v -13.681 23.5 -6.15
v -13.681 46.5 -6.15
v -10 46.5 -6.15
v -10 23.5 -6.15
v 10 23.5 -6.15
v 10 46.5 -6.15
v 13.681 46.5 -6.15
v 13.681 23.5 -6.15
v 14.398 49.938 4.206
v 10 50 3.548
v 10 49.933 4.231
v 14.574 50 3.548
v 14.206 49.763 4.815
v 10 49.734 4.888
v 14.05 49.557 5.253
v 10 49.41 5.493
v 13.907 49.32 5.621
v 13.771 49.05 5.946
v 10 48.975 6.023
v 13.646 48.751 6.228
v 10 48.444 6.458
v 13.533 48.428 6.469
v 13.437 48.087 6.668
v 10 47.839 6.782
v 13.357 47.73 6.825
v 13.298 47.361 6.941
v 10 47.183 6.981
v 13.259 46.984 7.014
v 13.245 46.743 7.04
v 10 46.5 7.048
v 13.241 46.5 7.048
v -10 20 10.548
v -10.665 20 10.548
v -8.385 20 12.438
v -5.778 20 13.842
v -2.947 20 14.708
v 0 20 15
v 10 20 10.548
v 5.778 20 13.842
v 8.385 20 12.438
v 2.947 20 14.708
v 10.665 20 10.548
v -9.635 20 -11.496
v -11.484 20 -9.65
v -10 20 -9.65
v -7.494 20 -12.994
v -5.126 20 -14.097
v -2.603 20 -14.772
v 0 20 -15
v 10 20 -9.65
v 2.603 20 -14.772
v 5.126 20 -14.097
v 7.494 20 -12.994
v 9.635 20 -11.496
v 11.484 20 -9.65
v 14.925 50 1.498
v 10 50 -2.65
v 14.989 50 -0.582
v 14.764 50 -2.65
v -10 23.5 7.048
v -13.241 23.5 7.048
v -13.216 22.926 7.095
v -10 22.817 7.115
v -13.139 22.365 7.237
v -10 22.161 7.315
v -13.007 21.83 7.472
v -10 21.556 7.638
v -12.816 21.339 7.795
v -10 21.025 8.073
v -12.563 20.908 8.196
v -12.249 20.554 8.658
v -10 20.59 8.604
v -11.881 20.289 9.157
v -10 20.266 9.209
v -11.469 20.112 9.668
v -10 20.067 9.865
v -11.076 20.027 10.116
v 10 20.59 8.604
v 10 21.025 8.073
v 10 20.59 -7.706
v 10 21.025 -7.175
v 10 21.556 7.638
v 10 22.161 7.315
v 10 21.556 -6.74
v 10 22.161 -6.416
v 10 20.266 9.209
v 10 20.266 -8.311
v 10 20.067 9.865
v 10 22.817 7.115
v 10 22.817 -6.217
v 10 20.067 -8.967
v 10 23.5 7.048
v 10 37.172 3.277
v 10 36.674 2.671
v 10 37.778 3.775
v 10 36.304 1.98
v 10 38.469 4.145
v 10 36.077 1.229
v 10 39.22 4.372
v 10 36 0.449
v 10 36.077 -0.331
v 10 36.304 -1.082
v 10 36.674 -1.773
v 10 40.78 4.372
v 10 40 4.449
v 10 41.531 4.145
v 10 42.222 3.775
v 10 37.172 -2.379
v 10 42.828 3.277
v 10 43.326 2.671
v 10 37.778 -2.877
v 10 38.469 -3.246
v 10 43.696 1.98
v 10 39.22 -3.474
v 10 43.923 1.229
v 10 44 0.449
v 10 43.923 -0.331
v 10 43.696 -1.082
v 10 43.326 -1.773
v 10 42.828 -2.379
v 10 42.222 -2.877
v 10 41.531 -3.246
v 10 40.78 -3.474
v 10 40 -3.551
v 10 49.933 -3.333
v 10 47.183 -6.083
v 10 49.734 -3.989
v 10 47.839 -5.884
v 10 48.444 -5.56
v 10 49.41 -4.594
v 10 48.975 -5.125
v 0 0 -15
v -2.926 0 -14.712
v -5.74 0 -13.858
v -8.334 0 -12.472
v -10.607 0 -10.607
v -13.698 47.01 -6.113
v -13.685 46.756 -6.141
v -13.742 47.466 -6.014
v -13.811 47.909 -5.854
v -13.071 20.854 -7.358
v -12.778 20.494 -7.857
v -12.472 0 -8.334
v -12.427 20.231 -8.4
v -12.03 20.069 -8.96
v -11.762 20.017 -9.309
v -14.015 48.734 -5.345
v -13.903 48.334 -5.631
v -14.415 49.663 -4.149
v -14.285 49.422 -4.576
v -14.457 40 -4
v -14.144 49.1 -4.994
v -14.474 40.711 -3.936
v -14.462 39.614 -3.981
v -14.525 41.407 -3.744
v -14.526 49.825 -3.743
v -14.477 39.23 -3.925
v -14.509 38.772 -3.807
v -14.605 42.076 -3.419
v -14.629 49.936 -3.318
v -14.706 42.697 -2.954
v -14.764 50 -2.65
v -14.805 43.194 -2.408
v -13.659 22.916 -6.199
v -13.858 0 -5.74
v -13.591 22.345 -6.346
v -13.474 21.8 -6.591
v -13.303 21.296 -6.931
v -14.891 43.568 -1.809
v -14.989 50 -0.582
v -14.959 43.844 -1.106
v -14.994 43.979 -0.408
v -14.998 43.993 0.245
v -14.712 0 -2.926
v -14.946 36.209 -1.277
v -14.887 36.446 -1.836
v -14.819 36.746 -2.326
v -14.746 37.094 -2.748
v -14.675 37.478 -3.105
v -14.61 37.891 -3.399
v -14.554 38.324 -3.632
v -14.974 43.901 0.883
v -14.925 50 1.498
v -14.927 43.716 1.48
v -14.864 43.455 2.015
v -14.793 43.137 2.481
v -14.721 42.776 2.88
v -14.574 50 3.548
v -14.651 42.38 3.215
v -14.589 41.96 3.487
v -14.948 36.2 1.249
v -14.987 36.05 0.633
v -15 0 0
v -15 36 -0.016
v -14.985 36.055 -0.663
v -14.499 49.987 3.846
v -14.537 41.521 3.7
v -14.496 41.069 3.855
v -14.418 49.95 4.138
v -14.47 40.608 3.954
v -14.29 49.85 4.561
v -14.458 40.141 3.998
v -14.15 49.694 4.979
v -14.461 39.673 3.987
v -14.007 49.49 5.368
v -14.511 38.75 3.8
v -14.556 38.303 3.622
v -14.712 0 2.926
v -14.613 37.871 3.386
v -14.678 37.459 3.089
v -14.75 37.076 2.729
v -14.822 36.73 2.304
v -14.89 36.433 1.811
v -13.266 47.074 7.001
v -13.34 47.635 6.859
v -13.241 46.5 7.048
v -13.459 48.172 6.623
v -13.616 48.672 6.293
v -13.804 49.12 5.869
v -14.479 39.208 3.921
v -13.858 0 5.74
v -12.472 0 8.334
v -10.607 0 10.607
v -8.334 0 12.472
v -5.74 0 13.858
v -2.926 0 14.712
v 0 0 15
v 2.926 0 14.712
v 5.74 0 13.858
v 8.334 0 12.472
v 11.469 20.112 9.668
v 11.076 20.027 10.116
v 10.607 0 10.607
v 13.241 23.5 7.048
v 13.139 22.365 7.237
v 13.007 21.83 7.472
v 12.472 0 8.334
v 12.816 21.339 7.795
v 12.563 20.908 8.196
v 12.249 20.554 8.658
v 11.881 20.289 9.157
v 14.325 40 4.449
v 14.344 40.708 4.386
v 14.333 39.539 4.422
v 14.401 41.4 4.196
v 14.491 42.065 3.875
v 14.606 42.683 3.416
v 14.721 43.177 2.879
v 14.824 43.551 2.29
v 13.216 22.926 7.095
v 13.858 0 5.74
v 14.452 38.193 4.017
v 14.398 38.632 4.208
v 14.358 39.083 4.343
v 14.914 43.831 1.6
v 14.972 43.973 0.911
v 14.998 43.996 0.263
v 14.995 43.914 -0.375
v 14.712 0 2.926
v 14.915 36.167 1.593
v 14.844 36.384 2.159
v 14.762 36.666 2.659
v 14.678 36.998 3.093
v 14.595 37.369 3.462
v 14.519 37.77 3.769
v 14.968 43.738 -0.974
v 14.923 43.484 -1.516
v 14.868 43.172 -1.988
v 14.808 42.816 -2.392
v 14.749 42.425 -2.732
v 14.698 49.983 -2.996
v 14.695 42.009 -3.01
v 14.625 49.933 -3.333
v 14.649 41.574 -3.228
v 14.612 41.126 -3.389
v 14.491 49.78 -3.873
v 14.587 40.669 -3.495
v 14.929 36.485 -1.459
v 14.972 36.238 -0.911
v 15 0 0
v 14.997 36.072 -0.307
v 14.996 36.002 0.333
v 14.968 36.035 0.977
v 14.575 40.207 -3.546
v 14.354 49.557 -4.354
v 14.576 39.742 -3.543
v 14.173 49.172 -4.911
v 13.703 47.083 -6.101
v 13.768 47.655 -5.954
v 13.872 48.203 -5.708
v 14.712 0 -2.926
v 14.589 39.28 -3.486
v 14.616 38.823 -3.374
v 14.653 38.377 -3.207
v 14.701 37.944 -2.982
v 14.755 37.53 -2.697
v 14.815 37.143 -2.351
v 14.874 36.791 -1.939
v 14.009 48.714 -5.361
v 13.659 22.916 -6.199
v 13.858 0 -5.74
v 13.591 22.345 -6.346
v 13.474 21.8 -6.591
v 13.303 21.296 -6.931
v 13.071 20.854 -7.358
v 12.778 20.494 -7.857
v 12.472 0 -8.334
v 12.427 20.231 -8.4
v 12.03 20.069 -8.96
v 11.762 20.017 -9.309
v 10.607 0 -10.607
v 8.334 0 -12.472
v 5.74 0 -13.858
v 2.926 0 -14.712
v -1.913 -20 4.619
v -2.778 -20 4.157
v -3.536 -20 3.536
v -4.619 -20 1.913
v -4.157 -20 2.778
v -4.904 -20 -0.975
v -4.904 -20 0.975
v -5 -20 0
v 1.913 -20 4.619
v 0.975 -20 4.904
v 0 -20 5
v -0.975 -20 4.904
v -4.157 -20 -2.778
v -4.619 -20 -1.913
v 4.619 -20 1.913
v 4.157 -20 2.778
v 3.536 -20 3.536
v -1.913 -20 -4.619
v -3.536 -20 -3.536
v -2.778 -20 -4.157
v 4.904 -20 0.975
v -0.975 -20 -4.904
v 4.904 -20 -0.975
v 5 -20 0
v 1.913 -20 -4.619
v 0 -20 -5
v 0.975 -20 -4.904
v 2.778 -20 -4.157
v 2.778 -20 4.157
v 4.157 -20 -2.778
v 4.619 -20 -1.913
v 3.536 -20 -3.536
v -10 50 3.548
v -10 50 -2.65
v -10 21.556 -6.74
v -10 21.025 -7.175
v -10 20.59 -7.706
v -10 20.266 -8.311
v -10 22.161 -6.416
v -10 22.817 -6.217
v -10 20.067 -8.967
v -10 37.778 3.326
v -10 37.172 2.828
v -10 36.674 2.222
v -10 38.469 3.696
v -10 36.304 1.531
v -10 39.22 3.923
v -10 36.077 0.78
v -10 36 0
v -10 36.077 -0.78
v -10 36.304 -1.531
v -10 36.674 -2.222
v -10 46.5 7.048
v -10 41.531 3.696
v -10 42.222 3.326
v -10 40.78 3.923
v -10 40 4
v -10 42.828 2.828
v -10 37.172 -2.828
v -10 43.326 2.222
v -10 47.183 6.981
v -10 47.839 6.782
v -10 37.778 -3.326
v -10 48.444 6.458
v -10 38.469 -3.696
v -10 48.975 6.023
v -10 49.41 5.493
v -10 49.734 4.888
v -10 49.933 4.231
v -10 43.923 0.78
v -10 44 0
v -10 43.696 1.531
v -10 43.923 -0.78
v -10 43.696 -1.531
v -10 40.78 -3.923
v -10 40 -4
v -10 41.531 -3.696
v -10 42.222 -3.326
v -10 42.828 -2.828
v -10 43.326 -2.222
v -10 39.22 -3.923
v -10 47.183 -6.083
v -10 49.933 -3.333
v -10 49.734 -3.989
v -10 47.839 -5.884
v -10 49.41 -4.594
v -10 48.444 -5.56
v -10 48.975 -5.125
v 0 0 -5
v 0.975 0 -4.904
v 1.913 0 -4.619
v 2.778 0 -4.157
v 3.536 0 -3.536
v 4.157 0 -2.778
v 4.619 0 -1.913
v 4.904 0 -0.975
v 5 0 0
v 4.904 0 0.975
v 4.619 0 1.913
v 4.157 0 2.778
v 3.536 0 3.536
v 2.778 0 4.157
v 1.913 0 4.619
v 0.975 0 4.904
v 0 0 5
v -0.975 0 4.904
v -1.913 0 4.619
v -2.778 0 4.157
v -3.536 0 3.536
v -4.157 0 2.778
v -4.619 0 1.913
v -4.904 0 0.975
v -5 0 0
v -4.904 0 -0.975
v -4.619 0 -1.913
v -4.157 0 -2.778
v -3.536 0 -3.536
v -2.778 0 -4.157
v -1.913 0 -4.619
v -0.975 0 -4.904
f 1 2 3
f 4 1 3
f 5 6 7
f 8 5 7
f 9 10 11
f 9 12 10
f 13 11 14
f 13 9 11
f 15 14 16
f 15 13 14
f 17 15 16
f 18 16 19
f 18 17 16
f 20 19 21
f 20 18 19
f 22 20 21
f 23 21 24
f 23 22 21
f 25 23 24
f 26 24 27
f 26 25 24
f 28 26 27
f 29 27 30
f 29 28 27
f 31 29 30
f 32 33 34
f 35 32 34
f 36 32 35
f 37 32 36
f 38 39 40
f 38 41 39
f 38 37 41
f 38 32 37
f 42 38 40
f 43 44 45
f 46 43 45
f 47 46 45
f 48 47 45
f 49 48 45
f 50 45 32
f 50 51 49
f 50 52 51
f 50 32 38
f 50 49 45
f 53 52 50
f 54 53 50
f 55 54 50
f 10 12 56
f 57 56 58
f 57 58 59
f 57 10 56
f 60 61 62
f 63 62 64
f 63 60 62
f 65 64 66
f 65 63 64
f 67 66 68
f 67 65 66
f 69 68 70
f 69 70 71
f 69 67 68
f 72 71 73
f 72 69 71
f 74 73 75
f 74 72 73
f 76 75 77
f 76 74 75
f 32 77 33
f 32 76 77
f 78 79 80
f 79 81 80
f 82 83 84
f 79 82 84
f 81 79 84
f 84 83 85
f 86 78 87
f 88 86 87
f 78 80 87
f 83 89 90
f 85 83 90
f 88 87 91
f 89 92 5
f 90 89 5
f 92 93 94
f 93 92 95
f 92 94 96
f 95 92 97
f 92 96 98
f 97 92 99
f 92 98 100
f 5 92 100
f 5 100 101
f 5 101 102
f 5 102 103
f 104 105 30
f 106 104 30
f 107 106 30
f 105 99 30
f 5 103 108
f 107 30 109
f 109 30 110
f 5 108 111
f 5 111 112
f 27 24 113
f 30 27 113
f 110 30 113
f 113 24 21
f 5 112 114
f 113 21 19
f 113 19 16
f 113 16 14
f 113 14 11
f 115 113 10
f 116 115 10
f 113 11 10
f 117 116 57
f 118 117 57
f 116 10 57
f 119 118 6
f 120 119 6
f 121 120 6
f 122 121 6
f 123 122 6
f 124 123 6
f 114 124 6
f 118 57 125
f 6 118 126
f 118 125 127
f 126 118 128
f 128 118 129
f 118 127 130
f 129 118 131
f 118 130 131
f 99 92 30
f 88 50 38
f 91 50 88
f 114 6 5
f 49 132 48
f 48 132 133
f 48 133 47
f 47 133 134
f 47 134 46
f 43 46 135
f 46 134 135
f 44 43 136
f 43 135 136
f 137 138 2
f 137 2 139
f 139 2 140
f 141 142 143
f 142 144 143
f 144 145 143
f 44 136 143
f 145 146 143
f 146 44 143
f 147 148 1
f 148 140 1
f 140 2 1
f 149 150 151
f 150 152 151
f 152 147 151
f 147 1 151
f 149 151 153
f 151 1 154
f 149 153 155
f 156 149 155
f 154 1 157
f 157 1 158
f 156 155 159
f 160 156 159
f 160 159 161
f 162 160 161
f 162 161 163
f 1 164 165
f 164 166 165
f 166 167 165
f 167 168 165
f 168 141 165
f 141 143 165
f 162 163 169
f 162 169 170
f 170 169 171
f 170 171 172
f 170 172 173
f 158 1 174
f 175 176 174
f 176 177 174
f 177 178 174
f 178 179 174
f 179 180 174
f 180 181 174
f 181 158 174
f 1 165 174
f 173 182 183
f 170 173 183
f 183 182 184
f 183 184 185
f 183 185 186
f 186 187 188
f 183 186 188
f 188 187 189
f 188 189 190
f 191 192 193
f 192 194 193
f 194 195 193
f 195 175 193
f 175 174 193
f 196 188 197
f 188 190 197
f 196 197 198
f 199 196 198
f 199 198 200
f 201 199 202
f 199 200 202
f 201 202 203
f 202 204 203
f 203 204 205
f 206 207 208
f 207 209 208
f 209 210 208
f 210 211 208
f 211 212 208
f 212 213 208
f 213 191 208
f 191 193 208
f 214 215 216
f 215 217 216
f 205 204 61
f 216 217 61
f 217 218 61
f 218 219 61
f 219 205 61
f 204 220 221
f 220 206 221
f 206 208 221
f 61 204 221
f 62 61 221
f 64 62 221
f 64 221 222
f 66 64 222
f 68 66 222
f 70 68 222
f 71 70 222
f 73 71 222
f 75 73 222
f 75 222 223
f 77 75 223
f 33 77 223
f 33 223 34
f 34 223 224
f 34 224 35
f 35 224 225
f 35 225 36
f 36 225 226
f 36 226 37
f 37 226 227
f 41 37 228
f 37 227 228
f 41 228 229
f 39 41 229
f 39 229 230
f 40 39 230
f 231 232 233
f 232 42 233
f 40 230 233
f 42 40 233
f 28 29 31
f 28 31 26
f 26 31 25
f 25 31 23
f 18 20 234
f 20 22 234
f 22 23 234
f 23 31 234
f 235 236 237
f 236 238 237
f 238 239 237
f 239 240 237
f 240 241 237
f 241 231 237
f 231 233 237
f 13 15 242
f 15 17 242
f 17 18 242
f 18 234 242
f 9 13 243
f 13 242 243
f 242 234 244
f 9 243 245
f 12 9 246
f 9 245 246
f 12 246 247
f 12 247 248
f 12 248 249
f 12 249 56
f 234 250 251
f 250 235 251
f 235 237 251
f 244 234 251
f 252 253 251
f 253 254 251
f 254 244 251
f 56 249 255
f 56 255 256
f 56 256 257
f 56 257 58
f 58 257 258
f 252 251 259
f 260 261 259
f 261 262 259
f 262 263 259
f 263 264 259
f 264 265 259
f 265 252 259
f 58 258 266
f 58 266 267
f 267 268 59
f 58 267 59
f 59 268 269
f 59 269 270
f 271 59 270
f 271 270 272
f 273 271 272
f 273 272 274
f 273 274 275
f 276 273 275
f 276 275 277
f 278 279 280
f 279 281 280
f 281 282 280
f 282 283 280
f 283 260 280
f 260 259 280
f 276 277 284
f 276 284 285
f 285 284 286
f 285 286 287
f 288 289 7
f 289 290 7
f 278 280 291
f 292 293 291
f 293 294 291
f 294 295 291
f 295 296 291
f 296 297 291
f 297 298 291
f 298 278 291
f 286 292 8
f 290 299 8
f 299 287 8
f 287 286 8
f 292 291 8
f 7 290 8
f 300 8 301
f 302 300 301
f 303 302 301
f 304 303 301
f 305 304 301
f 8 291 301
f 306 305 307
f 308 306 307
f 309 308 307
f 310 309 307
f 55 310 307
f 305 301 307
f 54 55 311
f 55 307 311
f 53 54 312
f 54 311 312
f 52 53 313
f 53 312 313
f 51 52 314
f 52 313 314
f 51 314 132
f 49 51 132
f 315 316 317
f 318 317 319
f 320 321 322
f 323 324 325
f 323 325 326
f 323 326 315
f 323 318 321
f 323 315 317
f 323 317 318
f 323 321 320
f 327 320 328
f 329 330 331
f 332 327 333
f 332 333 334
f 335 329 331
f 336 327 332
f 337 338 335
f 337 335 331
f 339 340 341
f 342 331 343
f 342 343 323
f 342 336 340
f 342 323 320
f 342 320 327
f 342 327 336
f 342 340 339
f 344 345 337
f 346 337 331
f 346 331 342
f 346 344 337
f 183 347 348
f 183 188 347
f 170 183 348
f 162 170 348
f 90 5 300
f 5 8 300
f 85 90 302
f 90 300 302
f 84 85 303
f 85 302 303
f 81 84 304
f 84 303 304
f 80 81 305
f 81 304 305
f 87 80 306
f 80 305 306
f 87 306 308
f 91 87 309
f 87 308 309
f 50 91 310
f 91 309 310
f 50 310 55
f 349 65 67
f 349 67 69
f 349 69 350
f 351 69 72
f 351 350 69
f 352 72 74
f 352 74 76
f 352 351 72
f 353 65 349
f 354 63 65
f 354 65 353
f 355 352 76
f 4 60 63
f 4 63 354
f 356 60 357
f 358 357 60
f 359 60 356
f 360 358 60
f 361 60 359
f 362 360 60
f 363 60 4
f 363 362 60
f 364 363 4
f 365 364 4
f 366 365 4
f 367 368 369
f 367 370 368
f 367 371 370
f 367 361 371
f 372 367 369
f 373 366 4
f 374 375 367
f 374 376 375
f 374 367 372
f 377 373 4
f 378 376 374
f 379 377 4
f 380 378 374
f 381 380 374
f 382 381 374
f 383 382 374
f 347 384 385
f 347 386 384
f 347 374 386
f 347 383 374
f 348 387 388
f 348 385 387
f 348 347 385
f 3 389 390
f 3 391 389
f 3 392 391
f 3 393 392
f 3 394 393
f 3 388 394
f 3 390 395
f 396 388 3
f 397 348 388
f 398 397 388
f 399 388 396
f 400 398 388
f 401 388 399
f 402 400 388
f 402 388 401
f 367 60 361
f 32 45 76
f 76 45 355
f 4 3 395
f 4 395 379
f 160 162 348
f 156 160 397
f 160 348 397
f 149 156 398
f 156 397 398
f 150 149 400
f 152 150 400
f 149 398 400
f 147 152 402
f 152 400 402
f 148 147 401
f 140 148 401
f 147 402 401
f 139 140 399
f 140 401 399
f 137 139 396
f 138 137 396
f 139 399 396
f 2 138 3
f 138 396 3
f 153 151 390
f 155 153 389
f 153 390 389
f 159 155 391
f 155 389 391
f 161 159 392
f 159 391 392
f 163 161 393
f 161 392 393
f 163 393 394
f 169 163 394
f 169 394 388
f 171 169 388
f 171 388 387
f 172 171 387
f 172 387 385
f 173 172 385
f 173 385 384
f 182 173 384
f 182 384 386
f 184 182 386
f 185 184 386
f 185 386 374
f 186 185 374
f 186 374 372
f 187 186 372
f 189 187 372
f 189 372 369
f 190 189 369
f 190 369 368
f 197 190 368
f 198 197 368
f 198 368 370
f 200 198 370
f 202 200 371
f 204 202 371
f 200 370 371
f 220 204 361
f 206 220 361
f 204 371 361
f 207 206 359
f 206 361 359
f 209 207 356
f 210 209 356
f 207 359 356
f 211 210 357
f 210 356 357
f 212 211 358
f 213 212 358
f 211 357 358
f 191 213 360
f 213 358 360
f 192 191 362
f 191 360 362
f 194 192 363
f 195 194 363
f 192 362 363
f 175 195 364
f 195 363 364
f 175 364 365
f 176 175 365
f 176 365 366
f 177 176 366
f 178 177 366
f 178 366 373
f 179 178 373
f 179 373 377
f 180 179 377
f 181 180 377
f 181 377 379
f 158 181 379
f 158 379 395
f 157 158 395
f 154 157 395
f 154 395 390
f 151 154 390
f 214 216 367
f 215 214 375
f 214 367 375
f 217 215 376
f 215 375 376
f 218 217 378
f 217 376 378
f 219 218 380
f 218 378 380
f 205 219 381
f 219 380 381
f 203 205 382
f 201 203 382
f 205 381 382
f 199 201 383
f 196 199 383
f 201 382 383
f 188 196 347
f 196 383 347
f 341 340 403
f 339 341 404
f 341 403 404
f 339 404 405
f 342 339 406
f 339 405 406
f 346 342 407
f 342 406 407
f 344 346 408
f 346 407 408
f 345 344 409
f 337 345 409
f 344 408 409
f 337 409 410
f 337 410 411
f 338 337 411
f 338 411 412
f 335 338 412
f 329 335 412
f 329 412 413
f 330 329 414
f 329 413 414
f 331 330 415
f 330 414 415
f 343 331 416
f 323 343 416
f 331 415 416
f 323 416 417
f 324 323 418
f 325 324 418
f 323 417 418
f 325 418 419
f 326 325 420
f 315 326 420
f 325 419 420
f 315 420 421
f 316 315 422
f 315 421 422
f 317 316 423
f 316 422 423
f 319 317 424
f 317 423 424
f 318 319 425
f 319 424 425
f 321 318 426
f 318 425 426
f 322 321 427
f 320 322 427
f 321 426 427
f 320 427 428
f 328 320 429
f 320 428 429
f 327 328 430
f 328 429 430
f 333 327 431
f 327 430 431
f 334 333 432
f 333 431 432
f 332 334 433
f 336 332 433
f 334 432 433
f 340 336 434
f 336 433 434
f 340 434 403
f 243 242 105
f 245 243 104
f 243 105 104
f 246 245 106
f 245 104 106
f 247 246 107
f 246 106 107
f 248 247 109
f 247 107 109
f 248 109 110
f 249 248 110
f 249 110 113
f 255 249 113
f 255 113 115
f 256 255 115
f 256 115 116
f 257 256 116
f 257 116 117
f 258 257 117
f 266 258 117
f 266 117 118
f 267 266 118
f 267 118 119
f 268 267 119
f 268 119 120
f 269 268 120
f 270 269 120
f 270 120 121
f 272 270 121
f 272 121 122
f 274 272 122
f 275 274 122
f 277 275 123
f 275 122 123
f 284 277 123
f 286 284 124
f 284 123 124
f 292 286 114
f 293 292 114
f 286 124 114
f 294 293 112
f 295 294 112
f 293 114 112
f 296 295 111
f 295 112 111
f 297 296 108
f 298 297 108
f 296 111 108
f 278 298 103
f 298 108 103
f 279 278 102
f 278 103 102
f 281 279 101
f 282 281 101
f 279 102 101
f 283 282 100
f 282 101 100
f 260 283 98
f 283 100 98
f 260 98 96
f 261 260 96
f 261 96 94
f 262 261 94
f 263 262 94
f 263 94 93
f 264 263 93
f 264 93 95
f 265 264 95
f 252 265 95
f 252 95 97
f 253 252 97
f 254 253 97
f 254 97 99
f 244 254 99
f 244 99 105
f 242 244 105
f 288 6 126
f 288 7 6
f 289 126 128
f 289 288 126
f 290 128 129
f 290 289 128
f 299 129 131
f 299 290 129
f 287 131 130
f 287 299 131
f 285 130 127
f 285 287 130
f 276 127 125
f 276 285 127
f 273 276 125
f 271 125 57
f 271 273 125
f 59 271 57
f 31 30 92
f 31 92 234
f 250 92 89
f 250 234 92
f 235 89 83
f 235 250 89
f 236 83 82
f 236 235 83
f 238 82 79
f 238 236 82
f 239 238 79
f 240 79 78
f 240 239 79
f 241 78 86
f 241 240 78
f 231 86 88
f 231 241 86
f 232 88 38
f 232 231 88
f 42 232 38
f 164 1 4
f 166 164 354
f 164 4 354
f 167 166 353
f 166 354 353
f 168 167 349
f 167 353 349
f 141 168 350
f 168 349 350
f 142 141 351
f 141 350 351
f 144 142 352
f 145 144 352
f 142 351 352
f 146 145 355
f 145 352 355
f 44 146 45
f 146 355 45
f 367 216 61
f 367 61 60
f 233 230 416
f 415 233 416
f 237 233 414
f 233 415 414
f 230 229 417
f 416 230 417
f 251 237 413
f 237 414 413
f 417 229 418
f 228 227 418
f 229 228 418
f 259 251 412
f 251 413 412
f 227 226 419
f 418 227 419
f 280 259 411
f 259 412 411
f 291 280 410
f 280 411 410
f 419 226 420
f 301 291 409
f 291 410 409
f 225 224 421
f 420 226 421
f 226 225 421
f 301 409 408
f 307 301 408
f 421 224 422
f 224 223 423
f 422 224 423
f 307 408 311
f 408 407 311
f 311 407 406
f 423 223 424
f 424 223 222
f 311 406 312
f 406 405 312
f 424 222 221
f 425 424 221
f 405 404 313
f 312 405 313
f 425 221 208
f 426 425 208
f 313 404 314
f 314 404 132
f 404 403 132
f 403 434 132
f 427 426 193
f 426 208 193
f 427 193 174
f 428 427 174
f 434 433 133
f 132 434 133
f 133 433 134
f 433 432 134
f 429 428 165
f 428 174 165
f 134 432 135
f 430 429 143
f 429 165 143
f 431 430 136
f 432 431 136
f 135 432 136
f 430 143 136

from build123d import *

# Parameters (mm, degrees)
SKETCH1_R           = 15
BOSS_EXTRUDE1_DEPTH = 50
SKETCH2_R           = 5
BOSS_EXTRUDE2_DEPTH = 20
SKETCH3_W           = 20
SKETCH3_H           = 48.158533428
CUT_EXTRUDE1_DEPTH  = 30
SKETCH4_W           = 29.182617016
SKETCH4_H           = 12.047974763
CUT_EXTRUDE4_DEPTH  = 30
SKETCH7_W           = 65.578145757
SKETCH7_H           = 22.973592685
CUT_EXTRUDE5_DEPTH  = 30
FILLET6_R           = 3.5
SKETCH9_R           = 4
CUT_EXTRUDE6_DEPTH  = 58.879184669
SKETCH11_R          = 4
CUT_EXTRUDE7_DEPTH  = 58.879184669


with BuildPart() as part:
    # Sketch1 → Boss-Extrude1 (new body)
    with BuildSketch(Plane(origin=(0, 0, 0), x_dir=(1, 0, 0), z_dir=(0, 1, 0))):
        with Locations(Location((0, 0, 0), (0, 0, 90))):
            Circle(SKETCH1_R)
    extrude(amount=BOSS_EXTRUDE1_DEPTH)

    # Sketch2 → Boss-Extrude2 (add)
    with BuildSketch(Plane.XZ):
        with Locations(Location((0, 0, 0), (0, 0, 270))):
            Circle(SKETCH2_R)
    extrude(amount=BOSS_EXTRUDE2_DEPTH)

    # Sketch3 → Cut-Extrude1 (cut)
    with BuildSketch(Plane(origin=(0, 50, 0), x_dir=(1, 0, 0), z_dir=(0, 1, 0))):
        Rectangle(SKETCH3_W, SKETCH3_H)
    extrude(amount=-CUT_EXTRUDE1_DEPTH, mode=Mode.SUBTRACT)

    # Sketch4 → Cut-Extrude4 (cut)
    with BuildSketch(Plane(origin=(0, 50, 0), x_dir=(1, 0, 0), z_dir=(0, 1, 0))):
        with Locations((0.622640913, 13.072097126)):
            Rectangle(SKETCH4_W, SKETCH4_H)
    cut_extrude4 = extrude(amount=-CUT_EXTRUDE4_DEPTH, mode=Mode.SUBTRACT)

    # Sketch7 → Cut-Extrude5 (cut)
    with BuildSketch(Plane(origin=(0, 50, 0), x_dir=(1, 0, 0), z_dir=(0, 1, 0))):
        with Locations((5.132045661, 17.636797086)):
            Rectangle(SKETCH7_W, SKETCH7_H)
    extrude(amount=-CUT_EXTRUDE5_DEPTH, mode=Mode.SUBTRACT)

    # Mirror1: Cut-Extrude4 across plane
    add(cut_extrude4.mirror(Plane.XY), mode=Mode.SUBTRACT)

    # Fillet6
    fillet6_edges = [part.edges().sort_by_distance(p)[0] for p in [
        (-11.84064125, 20, -6.150000743),
        (11.84064125, 20, -6.150000743),
        (-11.84064125, 50, -6.150000743),
        (11.84064125, 50, -6.150000743),
        (-11.620501285, 50, 7.048109744),
        (11.620501285, 50, 7.048109744),
        (-11.620501285, 20, 7.048109744),
        (11.620501285, 20, 7.048109744),
    ]]
    fillet(fillet6_edges, radius=FILLET6_R)

    # Sketch9 → Cut-Extrude6 (cut, through all)
    with BuildSketch(Plane(origin=(-10, 0, 0), x_dir=(0, 0, -1), z_dir=(1, 0, 0))):
        with Locations((0, 40)):
            Circle(SKETCH9_R)
    extrude(amount=-CUT_EXTRUDE6_DEPTH, mode=Mode.SUBTRACT)

    # Sketch11 → Cut-Extrude7 (cut, through all)
    with BuildSketch(Plane.ZY.offset(-10)):
        with Locations((0.4490545, 40)):
            Circle(SKETCH11_R)
    extrude(amount=-CUT_EXTRUDE7_DEPTH, mode=Mode.SUBTRACT)


solid = part.part
